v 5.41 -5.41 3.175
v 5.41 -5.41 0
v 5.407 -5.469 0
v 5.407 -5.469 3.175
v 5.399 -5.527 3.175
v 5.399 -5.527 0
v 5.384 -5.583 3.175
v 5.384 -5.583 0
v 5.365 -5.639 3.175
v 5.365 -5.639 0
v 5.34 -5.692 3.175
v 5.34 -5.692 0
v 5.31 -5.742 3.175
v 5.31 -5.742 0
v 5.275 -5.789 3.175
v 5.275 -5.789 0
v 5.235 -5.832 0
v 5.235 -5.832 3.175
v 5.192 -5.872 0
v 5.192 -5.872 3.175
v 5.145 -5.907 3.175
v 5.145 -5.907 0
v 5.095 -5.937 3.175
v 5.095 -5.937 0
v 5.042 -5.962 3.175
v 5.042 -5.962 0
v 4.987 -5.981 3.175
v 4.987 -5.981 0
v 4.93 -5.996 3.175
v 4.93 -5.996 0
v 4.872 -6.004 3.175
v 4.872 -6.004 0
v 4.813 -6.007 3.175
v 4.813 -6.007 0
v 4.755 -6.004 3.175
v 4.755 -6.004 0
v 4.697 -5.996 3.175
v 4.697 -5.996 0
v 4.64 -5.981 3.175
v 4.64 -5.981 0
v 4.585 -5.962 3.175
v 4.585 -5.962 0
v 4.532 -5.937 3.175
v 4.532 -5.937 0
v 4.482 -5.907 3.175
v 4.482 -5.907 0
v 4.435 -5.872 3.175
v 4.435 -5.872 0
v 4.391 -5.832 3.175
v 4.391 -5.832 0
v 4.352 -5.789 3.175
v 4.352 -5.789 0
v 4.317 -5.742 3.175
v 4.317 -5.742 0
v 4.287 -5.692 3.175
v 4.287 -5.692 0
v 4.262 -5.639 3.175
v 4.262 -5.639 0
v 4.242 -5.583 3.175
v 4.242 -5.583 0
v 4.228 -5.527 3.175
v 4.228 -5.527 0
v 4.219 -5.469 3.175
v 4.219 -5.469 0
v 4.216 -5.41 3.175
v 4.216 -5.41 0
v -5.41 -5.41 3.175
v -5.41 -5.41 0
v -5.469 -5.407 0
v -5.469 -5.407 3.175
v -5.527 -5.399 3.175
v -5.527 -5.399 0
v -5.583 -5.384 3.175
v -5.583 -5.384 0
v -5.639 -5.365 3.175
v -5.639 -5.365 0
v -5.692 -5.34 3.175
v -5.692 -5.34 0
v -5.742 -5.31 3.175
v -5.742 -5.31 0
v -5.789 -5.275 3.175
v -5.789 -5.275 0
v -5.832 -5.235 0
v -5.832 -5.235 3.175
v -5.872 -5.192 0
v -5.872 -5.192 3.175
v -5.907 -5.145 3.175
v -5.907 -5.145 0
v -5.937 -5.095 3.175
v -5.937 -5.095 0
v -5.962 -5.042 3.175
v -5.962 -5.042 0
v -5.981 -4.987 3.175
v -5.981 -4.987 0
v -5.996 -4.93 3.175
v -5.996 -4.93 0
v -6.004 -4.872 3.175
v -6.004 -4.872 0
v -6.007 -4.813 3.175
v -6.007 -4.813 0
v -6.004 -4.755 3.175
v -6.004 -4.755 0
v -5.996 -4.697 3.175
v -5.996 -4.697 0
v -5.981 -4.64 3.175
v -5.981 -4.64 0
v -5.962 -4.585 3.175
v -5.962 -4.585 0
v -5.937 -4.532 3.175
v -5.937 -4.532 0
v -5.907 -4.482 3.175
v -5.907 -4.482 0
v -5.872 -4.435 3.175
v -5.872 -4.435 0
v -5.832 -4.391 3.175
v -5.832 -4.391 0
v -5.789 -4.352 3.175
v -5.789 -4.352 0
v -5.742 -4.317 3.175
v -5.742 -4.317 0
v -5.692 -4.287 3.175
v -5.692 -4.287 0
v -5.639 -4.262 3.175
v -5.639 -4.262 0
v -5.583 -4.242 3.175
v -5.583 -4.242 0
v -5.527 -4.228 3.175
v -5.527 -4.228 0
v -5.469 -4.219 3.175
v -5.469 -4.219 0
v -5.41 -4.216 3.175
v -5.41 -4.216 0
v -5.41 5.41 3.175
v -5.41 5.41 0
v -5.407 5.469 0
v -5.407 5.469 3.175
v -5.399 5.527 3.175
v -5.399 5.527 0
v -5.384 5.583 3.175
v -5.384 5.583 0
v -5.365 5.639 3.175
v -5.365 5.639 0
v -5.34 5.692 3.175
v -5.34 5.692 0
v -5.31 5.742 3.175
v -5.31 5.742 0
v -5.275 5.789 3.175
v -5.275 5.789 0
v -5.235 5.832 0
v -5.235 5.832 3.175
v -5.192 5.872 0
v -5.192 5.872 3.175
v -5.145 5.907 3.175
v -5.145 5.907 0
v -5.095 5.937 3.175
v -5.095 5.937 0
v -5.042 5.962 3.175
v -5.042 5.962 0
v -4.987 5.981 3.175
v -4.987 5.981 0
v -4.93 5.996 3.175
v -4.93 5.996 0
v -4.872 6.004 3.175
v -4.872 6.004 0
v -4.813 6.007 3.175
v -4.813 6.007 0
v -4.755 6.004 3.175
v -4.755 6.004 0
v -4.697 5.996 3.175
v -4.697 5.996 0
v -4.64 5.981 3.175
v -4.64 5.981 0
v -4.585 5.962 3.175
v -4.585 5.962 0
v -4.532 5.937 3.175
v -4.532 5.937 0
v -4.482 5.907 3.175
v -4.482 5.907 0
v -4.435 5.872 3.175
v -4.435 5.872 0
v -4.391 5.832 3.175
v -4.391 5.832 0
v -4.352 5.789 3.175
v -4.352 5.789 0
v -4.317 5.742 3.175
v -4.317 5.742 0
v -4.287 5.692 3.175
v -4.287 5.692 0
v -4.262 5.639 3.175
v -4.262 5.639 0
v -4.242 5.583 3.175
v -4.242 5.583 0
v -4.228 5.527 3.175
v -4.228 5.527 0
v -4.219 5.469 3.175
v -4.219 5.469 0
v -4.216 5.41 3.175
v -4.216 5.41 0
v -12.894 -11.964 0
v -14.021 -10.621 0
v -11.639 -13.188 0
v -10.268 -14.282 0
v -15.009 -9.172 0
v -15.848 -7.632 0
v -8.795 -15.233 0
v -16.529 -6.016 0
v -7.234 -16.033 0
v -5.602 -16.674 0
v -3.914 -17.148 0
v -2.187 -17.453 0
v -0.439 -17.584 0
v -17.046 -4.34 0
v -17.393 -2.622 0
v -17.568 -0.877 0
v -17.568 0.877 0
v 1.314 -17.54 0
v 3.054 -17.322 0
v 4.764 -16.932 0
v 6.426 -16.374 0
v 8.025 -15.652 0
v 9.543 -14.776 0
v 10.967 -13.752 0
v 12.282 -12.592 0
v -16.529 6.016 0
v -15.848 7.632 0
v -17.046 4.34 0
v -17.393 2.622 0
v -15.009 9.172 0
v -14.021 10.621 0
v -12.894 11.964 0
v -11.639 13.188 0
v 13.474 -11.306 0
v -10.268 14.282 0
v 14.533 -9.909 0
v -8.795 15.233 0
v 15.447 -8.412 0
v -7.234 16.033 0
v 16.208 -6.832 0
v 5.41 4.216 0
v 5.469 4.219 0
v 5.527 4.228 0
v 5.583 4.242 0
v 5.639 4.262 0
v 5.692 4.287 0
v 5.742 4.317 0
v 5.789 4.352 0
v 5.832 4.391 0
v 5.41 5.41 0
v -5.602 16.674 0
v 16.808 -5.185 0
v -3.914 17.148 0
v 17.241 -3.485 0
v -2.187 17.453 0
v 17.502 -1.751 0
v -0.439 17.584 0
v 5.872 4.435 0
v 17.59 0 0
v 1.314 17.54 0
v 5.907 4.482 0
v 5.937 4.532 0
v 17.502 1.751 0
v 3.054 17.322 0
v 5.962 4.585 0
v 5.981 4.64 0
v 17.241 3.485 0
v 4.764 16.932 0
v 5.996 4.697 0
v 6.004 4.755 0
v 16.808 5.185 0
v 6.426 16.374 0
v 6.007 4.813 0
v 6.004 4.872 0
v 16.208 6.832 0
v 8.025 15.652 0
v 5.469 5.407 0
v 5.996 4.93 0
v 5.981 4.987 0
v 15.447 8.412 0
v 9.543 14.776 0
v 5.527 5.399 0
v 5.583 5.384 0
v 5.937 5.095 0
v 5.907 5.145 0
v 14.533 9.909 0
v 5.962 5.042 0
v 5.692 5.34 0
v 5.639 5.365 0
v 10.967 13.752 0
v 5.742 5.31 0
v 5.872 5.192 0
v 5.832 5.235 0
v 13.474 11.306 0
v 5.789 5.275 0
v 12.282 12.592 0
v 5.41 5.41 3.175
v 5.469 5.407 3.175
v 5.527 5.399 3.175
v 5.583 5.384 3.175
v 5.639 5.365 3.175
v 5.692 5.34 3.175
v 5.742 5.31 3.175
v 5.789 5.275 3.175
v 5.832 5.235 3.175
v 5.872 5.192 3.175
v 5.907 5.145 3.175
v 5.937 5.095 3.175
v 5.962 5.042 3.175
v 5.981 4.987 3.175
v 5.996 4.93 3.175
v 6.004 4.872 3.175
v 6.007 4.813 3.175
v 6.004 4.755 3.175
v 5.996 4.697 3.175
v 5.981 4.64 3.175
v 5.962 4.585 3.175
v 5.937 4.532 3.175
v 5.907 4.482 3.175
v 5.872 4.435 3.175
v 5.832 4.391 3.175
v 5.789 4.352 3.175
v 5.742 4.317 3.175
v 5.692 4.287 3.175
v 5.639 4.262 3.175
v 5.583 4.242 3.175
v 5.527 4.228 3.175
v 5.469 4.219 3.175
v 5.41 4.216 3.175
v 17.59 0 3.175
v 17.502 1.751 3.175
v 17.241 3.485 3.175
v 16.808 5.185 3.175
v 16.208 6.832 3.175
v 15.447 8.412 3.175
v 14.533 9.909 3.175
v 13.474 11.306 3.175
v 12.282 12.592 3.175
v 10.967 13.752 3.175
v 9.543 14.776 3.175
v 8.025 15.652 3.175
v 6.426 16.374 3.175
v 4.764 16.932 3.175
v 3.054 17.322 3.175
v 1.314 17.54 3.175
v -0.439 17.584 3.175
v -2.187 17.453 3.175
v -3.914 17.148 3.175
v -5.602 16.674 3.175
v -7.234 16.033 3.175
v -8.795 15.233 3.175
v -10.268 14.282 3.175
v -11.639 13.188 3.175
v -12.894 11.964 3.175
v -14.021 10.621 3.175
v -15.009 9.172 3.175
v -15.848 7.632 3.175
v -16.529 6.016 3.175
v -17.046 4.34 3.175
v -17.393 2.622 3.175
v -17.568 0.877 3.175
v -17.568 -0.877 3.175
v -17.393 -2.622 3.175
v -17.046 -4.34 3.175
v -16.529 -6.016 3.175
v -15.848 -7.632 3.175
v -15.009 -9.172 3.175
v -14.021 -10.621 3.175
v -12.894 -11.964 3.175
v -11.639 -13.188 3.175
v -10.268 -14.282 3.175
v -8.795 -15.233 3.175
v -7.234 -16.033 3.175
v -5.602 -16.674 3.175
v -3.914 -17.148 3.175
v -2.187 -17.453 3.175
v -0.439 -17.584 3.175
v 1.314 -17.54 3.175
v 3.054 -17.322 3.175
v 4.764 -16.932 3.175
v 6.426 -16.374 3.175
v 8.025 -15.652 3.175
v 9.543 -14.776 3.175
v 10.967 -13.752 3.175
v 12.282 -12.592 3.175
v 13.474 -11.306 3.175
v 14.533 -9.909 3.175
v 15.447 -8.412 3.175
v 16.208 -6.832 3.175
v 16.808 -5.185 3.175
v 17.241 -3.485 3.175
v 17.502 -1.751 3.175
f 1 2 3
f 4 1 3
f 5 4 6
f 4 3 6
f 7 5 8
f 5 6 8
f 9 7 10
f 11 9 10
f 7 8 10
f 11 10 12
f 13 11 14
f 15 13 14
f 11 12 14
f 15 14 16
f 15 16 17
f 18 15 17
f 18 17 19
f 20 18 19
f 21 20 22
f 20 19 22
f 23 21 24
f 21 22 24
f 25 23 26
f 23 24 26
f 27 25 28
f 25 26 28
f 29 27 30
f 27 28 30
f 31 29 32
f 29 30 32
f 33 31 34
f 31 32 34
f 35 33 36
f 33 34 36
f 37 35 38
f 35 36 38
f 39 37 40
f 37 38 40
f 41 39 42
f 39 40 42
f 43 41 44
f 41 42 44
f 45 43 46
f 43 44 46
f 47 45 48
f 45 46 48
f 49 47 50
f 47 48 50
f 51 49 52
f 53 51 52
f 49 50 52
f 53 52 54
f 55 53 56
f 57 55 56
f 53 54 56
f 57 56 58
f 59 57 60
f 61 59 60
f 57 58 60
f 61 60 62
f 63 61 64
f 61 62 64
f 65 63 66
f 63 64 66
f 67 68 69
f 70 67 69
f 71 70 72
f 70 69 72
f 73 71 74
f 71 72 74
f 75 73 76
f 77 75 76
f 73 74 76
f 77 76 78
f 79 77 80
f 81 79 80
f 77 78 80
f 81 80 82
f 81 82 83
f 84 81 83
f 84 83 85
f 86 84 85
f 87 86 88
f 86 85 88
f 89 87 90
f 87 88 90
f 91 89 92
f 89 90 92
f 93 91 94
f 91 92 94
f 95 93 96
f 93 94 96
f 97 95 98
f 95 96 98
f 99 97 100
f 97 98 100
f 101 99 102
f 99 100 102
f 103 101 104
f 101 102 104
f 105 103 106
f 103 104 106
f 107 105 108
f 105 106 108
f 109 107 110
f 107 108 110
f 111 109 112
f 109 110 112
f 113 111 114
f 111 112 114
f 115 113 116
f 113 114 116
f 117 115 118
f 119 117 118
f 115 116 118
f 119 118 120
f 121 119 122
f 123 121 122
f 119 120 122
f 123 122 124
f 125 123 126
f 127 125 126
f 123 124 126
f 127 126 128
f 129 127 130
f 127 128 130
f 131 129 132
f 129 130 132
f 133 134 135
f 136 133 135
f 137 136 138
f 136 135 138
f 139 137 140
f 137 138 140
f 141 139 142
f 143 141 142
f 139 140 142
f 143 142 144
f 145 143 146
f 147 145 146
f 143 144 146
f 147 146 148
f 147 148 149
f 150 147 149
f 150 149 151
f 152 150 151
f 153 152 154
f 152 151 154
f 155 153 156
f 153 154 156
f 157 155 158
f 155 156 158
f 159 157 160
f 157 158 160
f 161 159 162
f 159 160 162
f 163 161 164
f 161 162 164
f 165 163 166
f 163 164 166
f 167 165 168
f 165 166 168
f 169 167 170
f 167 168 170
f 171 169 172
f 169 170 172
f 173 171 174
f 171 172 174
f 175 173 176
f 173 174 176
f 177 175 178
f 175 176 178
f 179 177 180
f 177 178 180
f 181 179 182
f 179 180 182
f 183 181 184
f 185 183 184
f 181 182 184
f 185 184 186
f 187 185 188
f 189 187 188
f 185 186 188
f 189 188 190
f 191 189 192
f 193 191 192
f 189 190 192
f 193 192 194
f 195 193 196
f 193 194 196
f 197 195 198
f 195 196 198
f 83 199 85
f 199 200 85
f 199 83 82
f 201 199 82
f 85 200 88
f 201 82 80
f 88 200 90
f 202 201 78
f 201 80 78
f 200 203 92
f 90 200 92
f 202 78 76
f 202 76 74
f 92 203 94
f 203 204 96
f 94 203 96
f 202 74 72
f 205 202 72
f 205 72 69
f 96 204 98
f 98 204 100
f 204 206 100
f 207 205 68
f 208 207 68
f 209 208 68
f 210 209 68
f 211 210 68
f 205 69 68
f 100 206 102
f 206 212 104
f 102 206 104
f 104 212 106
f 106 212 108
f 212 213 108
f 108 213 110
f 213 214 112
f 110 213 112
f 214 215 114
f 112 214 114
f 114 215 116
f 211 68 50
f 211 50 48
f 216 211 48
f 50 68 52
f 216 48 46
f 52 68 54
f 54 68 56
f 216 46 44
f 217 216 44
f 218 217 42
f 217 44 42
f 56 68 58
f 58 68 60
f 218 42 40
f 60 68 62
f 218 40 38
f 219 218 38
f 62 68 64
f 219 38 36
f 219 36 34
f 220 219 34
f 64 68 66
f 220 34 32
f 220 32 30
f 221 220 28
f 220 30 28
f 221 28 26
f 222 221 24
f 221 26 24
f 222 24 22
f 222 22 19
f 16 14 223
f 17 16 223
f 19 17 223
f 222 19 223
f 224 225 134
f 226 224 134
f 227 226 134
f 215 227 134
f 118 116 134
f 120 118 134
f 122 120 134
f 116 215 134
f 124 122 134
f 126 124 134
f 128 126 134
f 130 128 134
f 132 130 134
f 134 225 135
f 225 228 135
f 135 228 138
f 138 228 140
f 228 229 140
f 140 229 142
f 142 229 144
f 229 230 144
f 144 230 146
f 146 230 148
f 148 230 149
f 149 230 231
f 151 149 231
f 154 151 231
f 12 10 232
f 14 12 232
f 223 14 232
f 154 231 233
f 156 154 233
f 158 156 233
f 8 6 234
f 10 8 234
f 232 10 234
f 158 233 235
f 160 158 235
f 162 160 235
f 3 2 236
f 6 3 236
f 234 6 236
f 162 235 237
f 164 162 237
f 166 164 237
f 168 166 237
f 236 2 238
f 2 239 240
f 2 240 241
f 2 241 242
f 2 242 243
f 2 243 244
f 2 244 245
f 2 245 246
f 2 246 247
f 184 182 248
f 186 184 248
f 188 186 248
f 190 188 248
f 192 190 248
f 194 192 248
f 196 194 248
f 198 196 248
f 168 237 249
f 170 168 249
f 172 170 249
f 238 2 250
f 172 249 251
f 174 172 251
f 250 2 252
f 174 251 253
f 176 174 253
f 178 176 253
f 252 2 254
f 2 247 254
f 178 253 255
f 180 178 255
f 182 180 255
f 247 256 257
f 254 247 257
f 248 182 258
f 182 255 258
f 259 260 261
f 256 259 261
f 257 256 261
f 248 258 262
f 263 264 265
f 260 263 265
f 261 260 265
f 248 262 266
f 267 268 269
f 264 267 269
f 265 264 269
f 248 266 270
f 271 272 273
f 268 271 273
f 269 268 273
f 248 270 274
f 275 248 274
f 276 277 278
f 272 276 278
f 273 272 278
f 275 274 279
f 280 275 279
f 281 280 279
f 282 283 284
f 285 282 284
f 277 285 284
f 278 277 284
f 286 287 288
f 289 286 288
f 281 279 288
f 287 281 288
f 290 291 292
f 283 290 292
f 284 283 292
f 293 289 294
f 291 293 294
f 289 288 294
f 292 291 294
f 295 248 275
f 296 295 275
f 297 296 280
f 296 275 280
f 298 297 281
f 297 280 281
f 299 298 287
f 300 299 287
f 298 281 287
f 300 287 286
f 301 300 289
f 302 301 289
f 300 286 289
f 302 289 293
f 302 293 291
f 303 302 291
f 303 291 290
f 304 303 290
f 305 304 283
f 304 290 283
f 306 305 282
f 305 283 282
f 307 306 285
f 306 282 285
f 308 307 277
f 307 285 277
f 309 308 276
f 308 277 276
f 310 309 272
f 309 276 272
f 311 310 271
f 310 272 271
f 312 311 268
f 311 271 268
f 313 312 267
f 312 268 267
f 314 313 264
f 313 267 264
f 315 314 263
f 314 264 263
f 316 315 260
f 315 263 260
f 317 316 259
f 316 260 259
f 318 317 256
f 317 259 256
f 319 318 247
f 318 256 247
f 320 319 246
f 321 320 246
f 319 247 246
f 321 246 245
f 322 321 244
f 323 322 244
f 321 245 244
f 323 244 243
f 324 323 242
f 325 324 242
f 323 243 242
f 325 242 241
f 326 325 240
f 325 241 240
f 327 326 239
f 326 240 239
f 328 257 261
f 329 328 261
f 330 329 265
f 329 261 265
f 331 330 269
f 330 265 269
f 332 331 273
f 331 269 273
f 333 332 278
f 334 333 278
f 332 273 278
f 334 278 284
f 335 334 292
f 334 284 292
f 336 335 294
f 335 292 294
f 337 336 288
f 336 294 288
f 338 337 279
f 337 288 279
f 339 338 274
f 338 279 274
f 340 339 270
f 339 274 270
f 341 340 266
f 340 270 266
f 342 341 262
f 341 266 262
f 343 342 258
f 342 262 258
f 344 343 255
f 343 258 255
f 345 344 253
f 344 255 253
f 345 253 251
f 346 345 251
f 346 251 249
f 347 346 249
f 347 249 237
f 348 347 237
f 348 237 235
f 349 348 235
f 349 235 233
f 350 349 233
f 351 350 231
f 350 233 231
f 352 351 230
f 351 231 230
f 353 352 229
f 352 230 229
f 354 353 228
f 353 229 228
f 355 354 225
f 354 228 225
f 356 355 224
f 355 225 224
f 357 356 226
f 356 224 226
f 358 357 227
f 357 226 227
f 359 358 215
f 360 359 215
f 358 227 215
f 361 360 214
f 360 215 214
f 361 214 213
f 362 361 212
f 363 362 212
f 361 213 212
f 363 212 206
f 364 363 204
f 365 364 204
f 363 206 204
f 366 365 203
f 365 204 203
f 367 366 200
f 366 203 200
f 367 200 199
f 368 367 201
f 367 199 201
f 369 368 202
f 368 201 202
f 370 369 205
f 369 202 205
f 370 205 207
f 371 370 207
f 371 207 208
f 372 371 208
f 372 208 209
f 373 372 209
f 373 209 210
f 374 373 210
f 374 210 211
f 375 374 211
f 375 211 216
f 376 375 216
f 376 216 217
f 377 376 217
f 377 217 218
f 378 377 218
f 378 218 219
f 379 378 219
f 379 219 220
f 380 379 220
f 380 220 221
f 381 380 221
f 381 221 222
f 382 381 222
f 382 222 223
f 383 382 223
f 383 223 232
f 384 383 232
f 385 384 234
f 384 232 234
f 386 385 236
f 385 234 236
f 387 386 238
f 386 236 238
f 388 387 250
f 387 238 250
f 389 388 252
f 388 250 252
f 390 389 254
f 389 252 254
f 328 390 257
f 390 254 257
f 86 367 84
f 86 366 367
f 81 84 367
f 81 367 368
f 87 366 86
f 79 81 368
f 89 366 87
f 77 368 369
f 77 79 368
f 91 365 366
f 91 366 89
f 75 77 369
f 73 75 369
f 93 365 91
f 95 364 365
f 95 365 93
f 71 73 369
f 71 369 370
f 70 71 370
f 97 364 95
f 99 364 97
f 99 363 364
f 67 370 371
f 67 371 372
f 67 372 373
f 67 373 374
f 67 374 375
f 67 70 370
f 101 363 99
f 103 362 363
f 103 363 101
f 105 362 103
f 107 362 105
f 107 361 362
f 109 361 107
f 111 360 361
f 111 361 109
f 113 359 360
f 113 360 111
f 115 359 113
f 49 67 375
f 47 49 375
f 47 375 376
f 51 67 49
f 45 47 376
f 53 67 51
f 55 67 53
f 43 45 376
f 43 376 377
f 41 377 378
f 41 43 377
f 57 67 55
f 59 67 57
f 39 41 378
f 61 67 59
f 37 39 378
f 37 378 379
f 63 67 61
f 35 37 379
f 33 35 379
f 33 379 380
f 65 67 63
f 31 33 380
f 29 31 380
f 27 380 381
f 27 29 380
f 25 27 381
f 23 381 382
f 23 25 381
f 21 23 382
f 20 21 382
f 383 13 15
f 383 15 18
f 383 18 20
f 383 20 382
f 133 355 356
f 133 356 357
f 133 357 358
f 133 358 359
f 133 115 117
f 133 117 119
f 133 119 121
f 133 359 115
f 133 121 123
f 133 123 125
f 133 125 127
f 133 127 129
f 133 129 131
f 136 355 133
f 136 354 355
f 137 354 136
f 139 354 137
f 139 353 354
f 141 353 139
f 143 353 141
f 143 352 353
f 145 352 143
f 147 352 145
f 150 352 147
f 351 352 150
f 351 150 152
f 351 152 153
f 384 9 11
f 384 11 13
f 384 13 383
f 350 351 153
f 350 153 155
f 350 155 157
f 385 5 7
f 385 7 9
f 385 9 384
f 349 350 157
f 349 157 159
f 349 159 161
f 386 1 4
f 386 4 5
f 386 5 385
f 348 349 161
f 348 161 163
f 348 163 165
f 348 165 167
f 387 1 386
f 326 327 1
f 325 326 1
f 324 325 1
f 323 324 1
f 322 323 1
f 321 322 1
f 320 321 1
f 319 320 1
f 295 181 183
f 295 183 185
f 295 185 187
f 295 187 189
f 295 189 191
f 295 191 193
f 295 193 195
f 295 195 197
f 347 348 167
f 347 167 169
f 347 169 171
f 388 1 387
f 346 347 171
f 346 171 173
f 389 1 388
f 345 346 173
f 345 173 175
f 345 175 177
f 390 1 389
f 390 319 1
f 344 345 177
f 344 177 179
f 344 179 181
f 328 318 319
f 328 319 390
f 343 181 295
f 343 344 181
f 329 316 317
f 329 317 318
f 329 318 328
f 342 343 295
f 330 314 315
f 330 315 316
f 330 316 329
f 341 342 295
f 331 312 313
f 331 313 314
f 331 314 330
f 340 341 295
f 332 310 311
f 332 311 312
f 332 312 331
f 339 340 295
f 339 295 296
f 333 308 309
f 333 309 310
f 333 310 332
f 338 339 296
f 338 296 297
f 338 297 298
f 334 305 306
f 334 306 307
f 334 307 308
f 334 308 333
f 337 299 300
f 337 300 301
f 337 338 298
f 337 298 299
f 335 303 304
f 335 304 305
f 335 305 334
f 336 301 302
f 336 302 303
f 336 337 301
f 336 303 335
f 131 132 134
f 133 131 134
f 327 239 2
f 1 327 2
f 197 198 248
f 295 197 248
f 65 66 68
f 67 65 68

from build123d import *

# Parameters (mm, degrees)
F0_R     = 17.5895
F1_DEPTH = 3.175


with BuildPart() as f1:
    # F0 (on Top) → F1 (new body)
    with BuildSketch(Plane.XY):
        Circle(F0_R)
        with BuildLine():
            Line((-4.2164, 5.4102), (5.4102, 5.4102))
            ThreePointArc((5.4102, 5.4102), (6.0071, 4.8133), (5.4102, 4.2164))
            Line((5.4102, 4.2164), (5.4102, -5.4102))
            ThreePointArc((5.4102, -5.4102), (4.8133, -6.0071), (4.2164, -5.4102))
            Line((4.2164, -5.4102), (-5.4102, -5.4102))
            ThreePointArc((-5.4102, -5.4102), (-6.0071, -4.8133), (-5.4102, -4.2164))
            Line((-5.4102, -4.2164), (-5.4102, 5.4102))
            ThreePointArc((-5.4102, 5.4102), (-4.8133, 6.0071), (-4.2164, 5.4102))
        make_face(mode=Mode.SUBTRACT)
    extrude(amount=F1_DEPTH)


solid = f1.part
